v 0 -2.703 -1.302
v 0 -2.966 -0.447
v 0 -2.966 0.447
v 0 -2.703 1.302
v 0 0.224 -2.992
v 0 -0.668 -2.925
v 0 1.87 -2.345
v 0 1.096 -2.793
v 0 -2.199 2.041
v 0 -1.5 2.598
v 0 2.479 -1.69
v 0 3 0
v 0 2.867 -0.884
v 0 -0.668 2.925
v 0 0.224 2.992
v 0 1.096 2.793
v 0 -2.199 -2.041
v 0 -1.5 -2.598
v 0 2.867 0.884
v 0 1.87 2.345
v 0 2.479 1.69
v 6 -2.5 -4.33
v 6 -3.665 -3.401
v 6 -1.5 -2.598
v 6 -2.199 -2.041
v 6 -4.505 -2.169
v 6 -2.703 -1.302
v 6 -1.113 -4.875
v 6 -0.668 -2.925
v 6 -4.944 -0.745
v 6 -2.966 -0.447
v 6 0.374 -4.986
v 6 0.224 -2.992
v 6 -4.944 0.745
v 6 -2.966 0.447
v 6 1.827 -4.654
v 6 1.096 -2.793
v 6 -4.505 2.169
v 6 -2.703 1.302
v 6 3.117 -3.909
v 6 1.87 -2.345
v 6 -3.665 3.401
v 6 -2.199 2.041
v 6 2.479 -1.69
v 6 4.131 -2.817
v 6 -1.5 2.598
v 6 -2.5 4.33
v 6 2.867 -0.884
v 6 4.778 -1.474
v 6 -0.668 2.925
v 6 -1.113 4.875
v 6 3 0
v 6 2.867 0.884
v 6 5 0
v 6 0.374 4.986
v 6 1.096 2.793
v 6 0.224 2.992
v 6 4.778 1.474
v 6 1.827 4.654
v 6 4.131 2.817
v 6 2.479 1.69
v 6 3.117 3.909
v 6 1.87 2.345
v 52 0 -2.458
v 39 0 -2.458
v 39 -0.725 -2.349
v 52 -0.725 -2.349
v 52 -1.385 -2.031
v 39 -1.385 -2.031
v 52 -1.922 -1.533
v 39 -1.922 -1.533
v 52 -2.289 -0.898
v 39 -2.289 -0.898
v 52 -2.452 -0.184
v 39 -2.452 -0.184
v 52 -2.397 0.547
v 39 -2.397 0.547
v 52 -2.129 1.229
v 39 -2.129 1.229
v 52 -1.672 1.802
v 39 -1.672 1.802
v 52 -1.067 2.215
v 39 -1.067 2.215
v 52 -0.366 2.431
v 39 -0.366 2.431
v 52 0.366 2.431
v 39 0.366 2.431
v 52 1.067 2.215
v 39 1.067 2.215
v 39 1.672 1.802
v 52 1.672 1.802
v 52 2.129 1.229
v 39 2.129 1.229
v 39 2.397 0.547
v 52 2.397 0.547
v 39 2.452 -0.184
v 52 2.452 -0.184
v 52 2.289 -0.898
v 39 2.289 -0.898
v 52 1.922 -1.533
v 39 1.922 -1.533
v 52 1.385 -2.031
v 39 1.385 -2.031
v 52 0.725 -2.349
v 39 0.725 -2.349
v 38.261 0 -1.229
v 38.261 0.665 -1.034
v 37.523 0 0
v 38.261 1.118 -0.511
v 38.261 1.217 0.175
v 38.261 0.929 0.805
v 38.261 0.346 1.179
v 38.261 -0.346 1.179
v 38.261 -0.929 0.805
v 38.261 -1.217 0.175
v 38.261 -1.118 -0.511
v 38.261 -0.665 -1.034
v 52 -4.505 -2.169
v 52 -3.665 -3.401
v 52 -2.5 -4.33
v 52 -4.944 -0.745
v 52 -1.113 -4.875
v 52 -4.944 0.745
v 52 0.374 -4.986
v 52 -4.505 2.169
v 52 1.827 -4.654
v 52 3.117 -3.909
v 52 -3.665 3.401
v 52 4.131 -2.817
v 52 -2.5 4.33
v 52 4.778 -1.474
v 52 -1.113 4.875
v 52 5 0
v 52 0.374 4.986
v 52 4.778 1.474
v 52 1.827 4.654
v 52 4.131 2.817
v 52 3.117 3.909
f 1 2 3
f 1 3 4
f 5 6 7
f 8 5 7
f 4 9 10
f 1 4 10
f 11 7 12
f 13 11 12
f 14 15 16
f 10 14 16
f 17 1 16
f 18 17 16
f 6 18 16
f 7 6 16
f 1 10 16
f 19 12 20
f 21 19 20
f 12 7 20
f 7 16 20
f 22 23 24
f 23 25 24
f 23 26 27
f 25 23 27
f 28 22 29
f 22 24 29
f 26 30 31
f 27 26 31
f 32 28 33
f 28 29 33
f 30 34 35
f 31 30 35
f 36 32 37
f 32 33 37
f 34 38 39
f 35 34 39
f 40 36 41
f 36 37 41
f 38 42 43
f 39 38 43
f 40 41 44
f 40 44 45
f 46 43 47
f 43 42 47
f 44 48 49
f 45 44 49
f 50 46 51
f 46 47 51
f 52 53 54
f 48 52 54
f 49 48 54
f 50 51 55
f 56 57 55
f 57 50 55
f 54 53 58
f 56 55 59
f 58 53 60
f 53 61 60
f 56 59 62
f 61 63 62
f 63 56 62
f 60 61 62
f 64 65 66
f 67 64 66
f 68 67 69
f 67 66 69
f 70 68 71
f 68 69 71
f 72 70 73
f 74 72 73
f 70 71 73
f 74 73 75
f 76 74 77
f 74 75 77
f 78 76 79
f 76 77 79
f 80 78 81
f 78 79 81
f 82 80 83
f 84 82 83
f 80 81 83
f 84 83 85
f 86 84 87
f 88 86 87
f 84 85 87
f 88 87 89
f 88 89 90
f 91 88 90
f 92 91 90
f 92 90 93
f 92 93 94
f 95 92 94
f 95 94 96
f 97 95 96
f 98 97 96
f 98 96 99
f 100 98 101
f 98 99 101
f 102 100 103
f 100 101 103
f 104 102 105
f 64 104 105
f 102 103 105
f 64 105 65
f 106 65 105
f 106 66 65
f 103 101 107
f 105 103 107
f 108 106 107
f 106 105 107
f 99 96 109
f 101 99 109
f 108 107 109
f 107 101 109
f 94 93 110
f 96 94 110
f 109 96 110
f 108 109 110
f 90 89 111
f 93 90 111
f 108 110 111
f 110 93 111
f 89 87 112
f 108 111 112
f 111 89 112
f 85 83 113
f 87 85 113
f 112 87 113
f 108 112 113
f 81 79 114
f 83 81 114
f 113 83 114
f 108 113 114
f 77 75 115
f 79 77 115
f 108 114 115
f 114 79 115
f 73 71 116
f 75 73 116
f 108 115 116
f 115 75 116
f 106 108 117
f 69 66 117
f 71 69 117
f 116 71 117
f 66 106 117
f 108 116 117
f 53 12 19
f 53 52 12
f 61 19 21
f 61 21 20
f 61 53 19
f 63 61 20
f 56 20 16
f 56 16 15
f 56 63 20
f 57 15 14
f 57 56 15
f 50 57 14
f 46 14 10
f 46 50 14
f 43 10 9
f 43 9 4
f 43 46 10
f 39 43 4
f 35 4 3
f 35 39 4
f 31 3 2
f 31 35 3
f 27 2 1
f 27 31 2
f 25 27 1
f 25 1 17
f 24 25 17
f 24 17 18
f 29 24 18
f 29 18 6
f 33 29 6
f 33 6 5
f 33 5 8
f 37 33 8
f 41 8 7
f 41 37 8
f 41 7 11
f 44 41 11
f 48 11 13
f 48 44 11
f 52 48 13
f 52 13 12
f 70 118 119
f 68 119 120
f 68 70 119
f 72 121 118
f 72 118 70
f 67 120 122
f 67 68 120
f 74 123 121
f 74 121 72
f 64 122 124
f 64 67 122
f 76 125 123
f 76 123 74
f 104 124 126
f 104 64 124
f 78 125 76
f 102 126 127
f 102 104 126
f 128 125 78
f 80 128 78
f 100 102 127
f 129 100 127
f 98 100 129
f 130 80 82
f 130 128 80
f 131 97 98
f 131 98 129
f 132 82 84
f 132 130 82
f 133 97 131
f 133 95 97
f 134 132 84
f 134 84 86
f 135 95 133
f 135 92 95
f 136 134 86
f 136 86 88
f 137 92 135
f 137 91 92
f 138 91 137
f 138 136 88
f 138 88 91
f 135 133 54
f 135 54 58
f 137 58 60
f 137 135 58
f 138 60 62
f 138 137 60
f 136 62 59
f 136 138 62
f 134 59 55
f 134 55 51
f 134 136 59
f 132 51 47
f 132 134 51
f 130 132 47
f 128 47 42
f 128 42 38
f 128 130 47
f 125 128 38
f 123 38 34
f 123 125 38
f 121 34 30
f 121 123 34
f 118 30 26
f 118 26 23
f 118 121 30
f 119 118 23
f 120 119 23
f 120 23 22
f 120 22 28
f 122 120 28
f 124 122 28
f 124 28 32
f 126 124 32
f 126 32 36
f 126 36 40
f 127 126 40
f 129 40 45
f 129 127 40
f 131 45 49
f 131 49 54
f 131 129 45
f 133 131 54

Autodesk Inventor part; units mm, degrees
ref_plane "YZ Plane" through (0, 0, 0) normal (1, 0, 0) x (0, 1, 0)
ref_plane "XZ Plane" through (0, 0, 0) normal (0, 1, 0) x (-1, 0, 0)
ref_plane "XY Plane" through (0, 0, 0) normal (0, 0, 1) x (1, 0, 0)
sketch "Skizze1" plane through (0, 0, 0) normal (0, 0, 1) x (1, 0, 0)
  line L0 (0, 0) -> (52, 0)
  line L1 (0, 0) -> (0, 3)
  line L2 (0, 3) -> (6, 3)
  line L3 (6, 3) -> (6, 5)
  line L4 (6, 5) -> (52, 5)
  line L5 (52, 5) -> (52, 0)
  dimension "d1" = 6
  dimension "d2" = 10
  dimension "d3" = 6
  dimension "d18" = 52
revolve "Umdrehung1" add sketch "Skizze1" angle 360 about axis through (0, 0, 0) along (1, 0, 0)
sketch "Skizze2" plane through (52, 0, 0) normal (1, 0, 0) x (0, 0, -1)
  point P0 (0, 0)
  point P1 (0, 0)
hole "Bohrung1" at (52, 0, 0) direction (-1, 0, 0) diameter 4.917 depth 13 tip angle 118 thread size "M6x1" class "6H" standard "ISO Metric profile"
thread "Gewinde1" size "M6x1" class "6g" standard "ANSI Metric M Profile" full length
properties part number "kicker_mitte_alt" material "Aluminium 6061"
